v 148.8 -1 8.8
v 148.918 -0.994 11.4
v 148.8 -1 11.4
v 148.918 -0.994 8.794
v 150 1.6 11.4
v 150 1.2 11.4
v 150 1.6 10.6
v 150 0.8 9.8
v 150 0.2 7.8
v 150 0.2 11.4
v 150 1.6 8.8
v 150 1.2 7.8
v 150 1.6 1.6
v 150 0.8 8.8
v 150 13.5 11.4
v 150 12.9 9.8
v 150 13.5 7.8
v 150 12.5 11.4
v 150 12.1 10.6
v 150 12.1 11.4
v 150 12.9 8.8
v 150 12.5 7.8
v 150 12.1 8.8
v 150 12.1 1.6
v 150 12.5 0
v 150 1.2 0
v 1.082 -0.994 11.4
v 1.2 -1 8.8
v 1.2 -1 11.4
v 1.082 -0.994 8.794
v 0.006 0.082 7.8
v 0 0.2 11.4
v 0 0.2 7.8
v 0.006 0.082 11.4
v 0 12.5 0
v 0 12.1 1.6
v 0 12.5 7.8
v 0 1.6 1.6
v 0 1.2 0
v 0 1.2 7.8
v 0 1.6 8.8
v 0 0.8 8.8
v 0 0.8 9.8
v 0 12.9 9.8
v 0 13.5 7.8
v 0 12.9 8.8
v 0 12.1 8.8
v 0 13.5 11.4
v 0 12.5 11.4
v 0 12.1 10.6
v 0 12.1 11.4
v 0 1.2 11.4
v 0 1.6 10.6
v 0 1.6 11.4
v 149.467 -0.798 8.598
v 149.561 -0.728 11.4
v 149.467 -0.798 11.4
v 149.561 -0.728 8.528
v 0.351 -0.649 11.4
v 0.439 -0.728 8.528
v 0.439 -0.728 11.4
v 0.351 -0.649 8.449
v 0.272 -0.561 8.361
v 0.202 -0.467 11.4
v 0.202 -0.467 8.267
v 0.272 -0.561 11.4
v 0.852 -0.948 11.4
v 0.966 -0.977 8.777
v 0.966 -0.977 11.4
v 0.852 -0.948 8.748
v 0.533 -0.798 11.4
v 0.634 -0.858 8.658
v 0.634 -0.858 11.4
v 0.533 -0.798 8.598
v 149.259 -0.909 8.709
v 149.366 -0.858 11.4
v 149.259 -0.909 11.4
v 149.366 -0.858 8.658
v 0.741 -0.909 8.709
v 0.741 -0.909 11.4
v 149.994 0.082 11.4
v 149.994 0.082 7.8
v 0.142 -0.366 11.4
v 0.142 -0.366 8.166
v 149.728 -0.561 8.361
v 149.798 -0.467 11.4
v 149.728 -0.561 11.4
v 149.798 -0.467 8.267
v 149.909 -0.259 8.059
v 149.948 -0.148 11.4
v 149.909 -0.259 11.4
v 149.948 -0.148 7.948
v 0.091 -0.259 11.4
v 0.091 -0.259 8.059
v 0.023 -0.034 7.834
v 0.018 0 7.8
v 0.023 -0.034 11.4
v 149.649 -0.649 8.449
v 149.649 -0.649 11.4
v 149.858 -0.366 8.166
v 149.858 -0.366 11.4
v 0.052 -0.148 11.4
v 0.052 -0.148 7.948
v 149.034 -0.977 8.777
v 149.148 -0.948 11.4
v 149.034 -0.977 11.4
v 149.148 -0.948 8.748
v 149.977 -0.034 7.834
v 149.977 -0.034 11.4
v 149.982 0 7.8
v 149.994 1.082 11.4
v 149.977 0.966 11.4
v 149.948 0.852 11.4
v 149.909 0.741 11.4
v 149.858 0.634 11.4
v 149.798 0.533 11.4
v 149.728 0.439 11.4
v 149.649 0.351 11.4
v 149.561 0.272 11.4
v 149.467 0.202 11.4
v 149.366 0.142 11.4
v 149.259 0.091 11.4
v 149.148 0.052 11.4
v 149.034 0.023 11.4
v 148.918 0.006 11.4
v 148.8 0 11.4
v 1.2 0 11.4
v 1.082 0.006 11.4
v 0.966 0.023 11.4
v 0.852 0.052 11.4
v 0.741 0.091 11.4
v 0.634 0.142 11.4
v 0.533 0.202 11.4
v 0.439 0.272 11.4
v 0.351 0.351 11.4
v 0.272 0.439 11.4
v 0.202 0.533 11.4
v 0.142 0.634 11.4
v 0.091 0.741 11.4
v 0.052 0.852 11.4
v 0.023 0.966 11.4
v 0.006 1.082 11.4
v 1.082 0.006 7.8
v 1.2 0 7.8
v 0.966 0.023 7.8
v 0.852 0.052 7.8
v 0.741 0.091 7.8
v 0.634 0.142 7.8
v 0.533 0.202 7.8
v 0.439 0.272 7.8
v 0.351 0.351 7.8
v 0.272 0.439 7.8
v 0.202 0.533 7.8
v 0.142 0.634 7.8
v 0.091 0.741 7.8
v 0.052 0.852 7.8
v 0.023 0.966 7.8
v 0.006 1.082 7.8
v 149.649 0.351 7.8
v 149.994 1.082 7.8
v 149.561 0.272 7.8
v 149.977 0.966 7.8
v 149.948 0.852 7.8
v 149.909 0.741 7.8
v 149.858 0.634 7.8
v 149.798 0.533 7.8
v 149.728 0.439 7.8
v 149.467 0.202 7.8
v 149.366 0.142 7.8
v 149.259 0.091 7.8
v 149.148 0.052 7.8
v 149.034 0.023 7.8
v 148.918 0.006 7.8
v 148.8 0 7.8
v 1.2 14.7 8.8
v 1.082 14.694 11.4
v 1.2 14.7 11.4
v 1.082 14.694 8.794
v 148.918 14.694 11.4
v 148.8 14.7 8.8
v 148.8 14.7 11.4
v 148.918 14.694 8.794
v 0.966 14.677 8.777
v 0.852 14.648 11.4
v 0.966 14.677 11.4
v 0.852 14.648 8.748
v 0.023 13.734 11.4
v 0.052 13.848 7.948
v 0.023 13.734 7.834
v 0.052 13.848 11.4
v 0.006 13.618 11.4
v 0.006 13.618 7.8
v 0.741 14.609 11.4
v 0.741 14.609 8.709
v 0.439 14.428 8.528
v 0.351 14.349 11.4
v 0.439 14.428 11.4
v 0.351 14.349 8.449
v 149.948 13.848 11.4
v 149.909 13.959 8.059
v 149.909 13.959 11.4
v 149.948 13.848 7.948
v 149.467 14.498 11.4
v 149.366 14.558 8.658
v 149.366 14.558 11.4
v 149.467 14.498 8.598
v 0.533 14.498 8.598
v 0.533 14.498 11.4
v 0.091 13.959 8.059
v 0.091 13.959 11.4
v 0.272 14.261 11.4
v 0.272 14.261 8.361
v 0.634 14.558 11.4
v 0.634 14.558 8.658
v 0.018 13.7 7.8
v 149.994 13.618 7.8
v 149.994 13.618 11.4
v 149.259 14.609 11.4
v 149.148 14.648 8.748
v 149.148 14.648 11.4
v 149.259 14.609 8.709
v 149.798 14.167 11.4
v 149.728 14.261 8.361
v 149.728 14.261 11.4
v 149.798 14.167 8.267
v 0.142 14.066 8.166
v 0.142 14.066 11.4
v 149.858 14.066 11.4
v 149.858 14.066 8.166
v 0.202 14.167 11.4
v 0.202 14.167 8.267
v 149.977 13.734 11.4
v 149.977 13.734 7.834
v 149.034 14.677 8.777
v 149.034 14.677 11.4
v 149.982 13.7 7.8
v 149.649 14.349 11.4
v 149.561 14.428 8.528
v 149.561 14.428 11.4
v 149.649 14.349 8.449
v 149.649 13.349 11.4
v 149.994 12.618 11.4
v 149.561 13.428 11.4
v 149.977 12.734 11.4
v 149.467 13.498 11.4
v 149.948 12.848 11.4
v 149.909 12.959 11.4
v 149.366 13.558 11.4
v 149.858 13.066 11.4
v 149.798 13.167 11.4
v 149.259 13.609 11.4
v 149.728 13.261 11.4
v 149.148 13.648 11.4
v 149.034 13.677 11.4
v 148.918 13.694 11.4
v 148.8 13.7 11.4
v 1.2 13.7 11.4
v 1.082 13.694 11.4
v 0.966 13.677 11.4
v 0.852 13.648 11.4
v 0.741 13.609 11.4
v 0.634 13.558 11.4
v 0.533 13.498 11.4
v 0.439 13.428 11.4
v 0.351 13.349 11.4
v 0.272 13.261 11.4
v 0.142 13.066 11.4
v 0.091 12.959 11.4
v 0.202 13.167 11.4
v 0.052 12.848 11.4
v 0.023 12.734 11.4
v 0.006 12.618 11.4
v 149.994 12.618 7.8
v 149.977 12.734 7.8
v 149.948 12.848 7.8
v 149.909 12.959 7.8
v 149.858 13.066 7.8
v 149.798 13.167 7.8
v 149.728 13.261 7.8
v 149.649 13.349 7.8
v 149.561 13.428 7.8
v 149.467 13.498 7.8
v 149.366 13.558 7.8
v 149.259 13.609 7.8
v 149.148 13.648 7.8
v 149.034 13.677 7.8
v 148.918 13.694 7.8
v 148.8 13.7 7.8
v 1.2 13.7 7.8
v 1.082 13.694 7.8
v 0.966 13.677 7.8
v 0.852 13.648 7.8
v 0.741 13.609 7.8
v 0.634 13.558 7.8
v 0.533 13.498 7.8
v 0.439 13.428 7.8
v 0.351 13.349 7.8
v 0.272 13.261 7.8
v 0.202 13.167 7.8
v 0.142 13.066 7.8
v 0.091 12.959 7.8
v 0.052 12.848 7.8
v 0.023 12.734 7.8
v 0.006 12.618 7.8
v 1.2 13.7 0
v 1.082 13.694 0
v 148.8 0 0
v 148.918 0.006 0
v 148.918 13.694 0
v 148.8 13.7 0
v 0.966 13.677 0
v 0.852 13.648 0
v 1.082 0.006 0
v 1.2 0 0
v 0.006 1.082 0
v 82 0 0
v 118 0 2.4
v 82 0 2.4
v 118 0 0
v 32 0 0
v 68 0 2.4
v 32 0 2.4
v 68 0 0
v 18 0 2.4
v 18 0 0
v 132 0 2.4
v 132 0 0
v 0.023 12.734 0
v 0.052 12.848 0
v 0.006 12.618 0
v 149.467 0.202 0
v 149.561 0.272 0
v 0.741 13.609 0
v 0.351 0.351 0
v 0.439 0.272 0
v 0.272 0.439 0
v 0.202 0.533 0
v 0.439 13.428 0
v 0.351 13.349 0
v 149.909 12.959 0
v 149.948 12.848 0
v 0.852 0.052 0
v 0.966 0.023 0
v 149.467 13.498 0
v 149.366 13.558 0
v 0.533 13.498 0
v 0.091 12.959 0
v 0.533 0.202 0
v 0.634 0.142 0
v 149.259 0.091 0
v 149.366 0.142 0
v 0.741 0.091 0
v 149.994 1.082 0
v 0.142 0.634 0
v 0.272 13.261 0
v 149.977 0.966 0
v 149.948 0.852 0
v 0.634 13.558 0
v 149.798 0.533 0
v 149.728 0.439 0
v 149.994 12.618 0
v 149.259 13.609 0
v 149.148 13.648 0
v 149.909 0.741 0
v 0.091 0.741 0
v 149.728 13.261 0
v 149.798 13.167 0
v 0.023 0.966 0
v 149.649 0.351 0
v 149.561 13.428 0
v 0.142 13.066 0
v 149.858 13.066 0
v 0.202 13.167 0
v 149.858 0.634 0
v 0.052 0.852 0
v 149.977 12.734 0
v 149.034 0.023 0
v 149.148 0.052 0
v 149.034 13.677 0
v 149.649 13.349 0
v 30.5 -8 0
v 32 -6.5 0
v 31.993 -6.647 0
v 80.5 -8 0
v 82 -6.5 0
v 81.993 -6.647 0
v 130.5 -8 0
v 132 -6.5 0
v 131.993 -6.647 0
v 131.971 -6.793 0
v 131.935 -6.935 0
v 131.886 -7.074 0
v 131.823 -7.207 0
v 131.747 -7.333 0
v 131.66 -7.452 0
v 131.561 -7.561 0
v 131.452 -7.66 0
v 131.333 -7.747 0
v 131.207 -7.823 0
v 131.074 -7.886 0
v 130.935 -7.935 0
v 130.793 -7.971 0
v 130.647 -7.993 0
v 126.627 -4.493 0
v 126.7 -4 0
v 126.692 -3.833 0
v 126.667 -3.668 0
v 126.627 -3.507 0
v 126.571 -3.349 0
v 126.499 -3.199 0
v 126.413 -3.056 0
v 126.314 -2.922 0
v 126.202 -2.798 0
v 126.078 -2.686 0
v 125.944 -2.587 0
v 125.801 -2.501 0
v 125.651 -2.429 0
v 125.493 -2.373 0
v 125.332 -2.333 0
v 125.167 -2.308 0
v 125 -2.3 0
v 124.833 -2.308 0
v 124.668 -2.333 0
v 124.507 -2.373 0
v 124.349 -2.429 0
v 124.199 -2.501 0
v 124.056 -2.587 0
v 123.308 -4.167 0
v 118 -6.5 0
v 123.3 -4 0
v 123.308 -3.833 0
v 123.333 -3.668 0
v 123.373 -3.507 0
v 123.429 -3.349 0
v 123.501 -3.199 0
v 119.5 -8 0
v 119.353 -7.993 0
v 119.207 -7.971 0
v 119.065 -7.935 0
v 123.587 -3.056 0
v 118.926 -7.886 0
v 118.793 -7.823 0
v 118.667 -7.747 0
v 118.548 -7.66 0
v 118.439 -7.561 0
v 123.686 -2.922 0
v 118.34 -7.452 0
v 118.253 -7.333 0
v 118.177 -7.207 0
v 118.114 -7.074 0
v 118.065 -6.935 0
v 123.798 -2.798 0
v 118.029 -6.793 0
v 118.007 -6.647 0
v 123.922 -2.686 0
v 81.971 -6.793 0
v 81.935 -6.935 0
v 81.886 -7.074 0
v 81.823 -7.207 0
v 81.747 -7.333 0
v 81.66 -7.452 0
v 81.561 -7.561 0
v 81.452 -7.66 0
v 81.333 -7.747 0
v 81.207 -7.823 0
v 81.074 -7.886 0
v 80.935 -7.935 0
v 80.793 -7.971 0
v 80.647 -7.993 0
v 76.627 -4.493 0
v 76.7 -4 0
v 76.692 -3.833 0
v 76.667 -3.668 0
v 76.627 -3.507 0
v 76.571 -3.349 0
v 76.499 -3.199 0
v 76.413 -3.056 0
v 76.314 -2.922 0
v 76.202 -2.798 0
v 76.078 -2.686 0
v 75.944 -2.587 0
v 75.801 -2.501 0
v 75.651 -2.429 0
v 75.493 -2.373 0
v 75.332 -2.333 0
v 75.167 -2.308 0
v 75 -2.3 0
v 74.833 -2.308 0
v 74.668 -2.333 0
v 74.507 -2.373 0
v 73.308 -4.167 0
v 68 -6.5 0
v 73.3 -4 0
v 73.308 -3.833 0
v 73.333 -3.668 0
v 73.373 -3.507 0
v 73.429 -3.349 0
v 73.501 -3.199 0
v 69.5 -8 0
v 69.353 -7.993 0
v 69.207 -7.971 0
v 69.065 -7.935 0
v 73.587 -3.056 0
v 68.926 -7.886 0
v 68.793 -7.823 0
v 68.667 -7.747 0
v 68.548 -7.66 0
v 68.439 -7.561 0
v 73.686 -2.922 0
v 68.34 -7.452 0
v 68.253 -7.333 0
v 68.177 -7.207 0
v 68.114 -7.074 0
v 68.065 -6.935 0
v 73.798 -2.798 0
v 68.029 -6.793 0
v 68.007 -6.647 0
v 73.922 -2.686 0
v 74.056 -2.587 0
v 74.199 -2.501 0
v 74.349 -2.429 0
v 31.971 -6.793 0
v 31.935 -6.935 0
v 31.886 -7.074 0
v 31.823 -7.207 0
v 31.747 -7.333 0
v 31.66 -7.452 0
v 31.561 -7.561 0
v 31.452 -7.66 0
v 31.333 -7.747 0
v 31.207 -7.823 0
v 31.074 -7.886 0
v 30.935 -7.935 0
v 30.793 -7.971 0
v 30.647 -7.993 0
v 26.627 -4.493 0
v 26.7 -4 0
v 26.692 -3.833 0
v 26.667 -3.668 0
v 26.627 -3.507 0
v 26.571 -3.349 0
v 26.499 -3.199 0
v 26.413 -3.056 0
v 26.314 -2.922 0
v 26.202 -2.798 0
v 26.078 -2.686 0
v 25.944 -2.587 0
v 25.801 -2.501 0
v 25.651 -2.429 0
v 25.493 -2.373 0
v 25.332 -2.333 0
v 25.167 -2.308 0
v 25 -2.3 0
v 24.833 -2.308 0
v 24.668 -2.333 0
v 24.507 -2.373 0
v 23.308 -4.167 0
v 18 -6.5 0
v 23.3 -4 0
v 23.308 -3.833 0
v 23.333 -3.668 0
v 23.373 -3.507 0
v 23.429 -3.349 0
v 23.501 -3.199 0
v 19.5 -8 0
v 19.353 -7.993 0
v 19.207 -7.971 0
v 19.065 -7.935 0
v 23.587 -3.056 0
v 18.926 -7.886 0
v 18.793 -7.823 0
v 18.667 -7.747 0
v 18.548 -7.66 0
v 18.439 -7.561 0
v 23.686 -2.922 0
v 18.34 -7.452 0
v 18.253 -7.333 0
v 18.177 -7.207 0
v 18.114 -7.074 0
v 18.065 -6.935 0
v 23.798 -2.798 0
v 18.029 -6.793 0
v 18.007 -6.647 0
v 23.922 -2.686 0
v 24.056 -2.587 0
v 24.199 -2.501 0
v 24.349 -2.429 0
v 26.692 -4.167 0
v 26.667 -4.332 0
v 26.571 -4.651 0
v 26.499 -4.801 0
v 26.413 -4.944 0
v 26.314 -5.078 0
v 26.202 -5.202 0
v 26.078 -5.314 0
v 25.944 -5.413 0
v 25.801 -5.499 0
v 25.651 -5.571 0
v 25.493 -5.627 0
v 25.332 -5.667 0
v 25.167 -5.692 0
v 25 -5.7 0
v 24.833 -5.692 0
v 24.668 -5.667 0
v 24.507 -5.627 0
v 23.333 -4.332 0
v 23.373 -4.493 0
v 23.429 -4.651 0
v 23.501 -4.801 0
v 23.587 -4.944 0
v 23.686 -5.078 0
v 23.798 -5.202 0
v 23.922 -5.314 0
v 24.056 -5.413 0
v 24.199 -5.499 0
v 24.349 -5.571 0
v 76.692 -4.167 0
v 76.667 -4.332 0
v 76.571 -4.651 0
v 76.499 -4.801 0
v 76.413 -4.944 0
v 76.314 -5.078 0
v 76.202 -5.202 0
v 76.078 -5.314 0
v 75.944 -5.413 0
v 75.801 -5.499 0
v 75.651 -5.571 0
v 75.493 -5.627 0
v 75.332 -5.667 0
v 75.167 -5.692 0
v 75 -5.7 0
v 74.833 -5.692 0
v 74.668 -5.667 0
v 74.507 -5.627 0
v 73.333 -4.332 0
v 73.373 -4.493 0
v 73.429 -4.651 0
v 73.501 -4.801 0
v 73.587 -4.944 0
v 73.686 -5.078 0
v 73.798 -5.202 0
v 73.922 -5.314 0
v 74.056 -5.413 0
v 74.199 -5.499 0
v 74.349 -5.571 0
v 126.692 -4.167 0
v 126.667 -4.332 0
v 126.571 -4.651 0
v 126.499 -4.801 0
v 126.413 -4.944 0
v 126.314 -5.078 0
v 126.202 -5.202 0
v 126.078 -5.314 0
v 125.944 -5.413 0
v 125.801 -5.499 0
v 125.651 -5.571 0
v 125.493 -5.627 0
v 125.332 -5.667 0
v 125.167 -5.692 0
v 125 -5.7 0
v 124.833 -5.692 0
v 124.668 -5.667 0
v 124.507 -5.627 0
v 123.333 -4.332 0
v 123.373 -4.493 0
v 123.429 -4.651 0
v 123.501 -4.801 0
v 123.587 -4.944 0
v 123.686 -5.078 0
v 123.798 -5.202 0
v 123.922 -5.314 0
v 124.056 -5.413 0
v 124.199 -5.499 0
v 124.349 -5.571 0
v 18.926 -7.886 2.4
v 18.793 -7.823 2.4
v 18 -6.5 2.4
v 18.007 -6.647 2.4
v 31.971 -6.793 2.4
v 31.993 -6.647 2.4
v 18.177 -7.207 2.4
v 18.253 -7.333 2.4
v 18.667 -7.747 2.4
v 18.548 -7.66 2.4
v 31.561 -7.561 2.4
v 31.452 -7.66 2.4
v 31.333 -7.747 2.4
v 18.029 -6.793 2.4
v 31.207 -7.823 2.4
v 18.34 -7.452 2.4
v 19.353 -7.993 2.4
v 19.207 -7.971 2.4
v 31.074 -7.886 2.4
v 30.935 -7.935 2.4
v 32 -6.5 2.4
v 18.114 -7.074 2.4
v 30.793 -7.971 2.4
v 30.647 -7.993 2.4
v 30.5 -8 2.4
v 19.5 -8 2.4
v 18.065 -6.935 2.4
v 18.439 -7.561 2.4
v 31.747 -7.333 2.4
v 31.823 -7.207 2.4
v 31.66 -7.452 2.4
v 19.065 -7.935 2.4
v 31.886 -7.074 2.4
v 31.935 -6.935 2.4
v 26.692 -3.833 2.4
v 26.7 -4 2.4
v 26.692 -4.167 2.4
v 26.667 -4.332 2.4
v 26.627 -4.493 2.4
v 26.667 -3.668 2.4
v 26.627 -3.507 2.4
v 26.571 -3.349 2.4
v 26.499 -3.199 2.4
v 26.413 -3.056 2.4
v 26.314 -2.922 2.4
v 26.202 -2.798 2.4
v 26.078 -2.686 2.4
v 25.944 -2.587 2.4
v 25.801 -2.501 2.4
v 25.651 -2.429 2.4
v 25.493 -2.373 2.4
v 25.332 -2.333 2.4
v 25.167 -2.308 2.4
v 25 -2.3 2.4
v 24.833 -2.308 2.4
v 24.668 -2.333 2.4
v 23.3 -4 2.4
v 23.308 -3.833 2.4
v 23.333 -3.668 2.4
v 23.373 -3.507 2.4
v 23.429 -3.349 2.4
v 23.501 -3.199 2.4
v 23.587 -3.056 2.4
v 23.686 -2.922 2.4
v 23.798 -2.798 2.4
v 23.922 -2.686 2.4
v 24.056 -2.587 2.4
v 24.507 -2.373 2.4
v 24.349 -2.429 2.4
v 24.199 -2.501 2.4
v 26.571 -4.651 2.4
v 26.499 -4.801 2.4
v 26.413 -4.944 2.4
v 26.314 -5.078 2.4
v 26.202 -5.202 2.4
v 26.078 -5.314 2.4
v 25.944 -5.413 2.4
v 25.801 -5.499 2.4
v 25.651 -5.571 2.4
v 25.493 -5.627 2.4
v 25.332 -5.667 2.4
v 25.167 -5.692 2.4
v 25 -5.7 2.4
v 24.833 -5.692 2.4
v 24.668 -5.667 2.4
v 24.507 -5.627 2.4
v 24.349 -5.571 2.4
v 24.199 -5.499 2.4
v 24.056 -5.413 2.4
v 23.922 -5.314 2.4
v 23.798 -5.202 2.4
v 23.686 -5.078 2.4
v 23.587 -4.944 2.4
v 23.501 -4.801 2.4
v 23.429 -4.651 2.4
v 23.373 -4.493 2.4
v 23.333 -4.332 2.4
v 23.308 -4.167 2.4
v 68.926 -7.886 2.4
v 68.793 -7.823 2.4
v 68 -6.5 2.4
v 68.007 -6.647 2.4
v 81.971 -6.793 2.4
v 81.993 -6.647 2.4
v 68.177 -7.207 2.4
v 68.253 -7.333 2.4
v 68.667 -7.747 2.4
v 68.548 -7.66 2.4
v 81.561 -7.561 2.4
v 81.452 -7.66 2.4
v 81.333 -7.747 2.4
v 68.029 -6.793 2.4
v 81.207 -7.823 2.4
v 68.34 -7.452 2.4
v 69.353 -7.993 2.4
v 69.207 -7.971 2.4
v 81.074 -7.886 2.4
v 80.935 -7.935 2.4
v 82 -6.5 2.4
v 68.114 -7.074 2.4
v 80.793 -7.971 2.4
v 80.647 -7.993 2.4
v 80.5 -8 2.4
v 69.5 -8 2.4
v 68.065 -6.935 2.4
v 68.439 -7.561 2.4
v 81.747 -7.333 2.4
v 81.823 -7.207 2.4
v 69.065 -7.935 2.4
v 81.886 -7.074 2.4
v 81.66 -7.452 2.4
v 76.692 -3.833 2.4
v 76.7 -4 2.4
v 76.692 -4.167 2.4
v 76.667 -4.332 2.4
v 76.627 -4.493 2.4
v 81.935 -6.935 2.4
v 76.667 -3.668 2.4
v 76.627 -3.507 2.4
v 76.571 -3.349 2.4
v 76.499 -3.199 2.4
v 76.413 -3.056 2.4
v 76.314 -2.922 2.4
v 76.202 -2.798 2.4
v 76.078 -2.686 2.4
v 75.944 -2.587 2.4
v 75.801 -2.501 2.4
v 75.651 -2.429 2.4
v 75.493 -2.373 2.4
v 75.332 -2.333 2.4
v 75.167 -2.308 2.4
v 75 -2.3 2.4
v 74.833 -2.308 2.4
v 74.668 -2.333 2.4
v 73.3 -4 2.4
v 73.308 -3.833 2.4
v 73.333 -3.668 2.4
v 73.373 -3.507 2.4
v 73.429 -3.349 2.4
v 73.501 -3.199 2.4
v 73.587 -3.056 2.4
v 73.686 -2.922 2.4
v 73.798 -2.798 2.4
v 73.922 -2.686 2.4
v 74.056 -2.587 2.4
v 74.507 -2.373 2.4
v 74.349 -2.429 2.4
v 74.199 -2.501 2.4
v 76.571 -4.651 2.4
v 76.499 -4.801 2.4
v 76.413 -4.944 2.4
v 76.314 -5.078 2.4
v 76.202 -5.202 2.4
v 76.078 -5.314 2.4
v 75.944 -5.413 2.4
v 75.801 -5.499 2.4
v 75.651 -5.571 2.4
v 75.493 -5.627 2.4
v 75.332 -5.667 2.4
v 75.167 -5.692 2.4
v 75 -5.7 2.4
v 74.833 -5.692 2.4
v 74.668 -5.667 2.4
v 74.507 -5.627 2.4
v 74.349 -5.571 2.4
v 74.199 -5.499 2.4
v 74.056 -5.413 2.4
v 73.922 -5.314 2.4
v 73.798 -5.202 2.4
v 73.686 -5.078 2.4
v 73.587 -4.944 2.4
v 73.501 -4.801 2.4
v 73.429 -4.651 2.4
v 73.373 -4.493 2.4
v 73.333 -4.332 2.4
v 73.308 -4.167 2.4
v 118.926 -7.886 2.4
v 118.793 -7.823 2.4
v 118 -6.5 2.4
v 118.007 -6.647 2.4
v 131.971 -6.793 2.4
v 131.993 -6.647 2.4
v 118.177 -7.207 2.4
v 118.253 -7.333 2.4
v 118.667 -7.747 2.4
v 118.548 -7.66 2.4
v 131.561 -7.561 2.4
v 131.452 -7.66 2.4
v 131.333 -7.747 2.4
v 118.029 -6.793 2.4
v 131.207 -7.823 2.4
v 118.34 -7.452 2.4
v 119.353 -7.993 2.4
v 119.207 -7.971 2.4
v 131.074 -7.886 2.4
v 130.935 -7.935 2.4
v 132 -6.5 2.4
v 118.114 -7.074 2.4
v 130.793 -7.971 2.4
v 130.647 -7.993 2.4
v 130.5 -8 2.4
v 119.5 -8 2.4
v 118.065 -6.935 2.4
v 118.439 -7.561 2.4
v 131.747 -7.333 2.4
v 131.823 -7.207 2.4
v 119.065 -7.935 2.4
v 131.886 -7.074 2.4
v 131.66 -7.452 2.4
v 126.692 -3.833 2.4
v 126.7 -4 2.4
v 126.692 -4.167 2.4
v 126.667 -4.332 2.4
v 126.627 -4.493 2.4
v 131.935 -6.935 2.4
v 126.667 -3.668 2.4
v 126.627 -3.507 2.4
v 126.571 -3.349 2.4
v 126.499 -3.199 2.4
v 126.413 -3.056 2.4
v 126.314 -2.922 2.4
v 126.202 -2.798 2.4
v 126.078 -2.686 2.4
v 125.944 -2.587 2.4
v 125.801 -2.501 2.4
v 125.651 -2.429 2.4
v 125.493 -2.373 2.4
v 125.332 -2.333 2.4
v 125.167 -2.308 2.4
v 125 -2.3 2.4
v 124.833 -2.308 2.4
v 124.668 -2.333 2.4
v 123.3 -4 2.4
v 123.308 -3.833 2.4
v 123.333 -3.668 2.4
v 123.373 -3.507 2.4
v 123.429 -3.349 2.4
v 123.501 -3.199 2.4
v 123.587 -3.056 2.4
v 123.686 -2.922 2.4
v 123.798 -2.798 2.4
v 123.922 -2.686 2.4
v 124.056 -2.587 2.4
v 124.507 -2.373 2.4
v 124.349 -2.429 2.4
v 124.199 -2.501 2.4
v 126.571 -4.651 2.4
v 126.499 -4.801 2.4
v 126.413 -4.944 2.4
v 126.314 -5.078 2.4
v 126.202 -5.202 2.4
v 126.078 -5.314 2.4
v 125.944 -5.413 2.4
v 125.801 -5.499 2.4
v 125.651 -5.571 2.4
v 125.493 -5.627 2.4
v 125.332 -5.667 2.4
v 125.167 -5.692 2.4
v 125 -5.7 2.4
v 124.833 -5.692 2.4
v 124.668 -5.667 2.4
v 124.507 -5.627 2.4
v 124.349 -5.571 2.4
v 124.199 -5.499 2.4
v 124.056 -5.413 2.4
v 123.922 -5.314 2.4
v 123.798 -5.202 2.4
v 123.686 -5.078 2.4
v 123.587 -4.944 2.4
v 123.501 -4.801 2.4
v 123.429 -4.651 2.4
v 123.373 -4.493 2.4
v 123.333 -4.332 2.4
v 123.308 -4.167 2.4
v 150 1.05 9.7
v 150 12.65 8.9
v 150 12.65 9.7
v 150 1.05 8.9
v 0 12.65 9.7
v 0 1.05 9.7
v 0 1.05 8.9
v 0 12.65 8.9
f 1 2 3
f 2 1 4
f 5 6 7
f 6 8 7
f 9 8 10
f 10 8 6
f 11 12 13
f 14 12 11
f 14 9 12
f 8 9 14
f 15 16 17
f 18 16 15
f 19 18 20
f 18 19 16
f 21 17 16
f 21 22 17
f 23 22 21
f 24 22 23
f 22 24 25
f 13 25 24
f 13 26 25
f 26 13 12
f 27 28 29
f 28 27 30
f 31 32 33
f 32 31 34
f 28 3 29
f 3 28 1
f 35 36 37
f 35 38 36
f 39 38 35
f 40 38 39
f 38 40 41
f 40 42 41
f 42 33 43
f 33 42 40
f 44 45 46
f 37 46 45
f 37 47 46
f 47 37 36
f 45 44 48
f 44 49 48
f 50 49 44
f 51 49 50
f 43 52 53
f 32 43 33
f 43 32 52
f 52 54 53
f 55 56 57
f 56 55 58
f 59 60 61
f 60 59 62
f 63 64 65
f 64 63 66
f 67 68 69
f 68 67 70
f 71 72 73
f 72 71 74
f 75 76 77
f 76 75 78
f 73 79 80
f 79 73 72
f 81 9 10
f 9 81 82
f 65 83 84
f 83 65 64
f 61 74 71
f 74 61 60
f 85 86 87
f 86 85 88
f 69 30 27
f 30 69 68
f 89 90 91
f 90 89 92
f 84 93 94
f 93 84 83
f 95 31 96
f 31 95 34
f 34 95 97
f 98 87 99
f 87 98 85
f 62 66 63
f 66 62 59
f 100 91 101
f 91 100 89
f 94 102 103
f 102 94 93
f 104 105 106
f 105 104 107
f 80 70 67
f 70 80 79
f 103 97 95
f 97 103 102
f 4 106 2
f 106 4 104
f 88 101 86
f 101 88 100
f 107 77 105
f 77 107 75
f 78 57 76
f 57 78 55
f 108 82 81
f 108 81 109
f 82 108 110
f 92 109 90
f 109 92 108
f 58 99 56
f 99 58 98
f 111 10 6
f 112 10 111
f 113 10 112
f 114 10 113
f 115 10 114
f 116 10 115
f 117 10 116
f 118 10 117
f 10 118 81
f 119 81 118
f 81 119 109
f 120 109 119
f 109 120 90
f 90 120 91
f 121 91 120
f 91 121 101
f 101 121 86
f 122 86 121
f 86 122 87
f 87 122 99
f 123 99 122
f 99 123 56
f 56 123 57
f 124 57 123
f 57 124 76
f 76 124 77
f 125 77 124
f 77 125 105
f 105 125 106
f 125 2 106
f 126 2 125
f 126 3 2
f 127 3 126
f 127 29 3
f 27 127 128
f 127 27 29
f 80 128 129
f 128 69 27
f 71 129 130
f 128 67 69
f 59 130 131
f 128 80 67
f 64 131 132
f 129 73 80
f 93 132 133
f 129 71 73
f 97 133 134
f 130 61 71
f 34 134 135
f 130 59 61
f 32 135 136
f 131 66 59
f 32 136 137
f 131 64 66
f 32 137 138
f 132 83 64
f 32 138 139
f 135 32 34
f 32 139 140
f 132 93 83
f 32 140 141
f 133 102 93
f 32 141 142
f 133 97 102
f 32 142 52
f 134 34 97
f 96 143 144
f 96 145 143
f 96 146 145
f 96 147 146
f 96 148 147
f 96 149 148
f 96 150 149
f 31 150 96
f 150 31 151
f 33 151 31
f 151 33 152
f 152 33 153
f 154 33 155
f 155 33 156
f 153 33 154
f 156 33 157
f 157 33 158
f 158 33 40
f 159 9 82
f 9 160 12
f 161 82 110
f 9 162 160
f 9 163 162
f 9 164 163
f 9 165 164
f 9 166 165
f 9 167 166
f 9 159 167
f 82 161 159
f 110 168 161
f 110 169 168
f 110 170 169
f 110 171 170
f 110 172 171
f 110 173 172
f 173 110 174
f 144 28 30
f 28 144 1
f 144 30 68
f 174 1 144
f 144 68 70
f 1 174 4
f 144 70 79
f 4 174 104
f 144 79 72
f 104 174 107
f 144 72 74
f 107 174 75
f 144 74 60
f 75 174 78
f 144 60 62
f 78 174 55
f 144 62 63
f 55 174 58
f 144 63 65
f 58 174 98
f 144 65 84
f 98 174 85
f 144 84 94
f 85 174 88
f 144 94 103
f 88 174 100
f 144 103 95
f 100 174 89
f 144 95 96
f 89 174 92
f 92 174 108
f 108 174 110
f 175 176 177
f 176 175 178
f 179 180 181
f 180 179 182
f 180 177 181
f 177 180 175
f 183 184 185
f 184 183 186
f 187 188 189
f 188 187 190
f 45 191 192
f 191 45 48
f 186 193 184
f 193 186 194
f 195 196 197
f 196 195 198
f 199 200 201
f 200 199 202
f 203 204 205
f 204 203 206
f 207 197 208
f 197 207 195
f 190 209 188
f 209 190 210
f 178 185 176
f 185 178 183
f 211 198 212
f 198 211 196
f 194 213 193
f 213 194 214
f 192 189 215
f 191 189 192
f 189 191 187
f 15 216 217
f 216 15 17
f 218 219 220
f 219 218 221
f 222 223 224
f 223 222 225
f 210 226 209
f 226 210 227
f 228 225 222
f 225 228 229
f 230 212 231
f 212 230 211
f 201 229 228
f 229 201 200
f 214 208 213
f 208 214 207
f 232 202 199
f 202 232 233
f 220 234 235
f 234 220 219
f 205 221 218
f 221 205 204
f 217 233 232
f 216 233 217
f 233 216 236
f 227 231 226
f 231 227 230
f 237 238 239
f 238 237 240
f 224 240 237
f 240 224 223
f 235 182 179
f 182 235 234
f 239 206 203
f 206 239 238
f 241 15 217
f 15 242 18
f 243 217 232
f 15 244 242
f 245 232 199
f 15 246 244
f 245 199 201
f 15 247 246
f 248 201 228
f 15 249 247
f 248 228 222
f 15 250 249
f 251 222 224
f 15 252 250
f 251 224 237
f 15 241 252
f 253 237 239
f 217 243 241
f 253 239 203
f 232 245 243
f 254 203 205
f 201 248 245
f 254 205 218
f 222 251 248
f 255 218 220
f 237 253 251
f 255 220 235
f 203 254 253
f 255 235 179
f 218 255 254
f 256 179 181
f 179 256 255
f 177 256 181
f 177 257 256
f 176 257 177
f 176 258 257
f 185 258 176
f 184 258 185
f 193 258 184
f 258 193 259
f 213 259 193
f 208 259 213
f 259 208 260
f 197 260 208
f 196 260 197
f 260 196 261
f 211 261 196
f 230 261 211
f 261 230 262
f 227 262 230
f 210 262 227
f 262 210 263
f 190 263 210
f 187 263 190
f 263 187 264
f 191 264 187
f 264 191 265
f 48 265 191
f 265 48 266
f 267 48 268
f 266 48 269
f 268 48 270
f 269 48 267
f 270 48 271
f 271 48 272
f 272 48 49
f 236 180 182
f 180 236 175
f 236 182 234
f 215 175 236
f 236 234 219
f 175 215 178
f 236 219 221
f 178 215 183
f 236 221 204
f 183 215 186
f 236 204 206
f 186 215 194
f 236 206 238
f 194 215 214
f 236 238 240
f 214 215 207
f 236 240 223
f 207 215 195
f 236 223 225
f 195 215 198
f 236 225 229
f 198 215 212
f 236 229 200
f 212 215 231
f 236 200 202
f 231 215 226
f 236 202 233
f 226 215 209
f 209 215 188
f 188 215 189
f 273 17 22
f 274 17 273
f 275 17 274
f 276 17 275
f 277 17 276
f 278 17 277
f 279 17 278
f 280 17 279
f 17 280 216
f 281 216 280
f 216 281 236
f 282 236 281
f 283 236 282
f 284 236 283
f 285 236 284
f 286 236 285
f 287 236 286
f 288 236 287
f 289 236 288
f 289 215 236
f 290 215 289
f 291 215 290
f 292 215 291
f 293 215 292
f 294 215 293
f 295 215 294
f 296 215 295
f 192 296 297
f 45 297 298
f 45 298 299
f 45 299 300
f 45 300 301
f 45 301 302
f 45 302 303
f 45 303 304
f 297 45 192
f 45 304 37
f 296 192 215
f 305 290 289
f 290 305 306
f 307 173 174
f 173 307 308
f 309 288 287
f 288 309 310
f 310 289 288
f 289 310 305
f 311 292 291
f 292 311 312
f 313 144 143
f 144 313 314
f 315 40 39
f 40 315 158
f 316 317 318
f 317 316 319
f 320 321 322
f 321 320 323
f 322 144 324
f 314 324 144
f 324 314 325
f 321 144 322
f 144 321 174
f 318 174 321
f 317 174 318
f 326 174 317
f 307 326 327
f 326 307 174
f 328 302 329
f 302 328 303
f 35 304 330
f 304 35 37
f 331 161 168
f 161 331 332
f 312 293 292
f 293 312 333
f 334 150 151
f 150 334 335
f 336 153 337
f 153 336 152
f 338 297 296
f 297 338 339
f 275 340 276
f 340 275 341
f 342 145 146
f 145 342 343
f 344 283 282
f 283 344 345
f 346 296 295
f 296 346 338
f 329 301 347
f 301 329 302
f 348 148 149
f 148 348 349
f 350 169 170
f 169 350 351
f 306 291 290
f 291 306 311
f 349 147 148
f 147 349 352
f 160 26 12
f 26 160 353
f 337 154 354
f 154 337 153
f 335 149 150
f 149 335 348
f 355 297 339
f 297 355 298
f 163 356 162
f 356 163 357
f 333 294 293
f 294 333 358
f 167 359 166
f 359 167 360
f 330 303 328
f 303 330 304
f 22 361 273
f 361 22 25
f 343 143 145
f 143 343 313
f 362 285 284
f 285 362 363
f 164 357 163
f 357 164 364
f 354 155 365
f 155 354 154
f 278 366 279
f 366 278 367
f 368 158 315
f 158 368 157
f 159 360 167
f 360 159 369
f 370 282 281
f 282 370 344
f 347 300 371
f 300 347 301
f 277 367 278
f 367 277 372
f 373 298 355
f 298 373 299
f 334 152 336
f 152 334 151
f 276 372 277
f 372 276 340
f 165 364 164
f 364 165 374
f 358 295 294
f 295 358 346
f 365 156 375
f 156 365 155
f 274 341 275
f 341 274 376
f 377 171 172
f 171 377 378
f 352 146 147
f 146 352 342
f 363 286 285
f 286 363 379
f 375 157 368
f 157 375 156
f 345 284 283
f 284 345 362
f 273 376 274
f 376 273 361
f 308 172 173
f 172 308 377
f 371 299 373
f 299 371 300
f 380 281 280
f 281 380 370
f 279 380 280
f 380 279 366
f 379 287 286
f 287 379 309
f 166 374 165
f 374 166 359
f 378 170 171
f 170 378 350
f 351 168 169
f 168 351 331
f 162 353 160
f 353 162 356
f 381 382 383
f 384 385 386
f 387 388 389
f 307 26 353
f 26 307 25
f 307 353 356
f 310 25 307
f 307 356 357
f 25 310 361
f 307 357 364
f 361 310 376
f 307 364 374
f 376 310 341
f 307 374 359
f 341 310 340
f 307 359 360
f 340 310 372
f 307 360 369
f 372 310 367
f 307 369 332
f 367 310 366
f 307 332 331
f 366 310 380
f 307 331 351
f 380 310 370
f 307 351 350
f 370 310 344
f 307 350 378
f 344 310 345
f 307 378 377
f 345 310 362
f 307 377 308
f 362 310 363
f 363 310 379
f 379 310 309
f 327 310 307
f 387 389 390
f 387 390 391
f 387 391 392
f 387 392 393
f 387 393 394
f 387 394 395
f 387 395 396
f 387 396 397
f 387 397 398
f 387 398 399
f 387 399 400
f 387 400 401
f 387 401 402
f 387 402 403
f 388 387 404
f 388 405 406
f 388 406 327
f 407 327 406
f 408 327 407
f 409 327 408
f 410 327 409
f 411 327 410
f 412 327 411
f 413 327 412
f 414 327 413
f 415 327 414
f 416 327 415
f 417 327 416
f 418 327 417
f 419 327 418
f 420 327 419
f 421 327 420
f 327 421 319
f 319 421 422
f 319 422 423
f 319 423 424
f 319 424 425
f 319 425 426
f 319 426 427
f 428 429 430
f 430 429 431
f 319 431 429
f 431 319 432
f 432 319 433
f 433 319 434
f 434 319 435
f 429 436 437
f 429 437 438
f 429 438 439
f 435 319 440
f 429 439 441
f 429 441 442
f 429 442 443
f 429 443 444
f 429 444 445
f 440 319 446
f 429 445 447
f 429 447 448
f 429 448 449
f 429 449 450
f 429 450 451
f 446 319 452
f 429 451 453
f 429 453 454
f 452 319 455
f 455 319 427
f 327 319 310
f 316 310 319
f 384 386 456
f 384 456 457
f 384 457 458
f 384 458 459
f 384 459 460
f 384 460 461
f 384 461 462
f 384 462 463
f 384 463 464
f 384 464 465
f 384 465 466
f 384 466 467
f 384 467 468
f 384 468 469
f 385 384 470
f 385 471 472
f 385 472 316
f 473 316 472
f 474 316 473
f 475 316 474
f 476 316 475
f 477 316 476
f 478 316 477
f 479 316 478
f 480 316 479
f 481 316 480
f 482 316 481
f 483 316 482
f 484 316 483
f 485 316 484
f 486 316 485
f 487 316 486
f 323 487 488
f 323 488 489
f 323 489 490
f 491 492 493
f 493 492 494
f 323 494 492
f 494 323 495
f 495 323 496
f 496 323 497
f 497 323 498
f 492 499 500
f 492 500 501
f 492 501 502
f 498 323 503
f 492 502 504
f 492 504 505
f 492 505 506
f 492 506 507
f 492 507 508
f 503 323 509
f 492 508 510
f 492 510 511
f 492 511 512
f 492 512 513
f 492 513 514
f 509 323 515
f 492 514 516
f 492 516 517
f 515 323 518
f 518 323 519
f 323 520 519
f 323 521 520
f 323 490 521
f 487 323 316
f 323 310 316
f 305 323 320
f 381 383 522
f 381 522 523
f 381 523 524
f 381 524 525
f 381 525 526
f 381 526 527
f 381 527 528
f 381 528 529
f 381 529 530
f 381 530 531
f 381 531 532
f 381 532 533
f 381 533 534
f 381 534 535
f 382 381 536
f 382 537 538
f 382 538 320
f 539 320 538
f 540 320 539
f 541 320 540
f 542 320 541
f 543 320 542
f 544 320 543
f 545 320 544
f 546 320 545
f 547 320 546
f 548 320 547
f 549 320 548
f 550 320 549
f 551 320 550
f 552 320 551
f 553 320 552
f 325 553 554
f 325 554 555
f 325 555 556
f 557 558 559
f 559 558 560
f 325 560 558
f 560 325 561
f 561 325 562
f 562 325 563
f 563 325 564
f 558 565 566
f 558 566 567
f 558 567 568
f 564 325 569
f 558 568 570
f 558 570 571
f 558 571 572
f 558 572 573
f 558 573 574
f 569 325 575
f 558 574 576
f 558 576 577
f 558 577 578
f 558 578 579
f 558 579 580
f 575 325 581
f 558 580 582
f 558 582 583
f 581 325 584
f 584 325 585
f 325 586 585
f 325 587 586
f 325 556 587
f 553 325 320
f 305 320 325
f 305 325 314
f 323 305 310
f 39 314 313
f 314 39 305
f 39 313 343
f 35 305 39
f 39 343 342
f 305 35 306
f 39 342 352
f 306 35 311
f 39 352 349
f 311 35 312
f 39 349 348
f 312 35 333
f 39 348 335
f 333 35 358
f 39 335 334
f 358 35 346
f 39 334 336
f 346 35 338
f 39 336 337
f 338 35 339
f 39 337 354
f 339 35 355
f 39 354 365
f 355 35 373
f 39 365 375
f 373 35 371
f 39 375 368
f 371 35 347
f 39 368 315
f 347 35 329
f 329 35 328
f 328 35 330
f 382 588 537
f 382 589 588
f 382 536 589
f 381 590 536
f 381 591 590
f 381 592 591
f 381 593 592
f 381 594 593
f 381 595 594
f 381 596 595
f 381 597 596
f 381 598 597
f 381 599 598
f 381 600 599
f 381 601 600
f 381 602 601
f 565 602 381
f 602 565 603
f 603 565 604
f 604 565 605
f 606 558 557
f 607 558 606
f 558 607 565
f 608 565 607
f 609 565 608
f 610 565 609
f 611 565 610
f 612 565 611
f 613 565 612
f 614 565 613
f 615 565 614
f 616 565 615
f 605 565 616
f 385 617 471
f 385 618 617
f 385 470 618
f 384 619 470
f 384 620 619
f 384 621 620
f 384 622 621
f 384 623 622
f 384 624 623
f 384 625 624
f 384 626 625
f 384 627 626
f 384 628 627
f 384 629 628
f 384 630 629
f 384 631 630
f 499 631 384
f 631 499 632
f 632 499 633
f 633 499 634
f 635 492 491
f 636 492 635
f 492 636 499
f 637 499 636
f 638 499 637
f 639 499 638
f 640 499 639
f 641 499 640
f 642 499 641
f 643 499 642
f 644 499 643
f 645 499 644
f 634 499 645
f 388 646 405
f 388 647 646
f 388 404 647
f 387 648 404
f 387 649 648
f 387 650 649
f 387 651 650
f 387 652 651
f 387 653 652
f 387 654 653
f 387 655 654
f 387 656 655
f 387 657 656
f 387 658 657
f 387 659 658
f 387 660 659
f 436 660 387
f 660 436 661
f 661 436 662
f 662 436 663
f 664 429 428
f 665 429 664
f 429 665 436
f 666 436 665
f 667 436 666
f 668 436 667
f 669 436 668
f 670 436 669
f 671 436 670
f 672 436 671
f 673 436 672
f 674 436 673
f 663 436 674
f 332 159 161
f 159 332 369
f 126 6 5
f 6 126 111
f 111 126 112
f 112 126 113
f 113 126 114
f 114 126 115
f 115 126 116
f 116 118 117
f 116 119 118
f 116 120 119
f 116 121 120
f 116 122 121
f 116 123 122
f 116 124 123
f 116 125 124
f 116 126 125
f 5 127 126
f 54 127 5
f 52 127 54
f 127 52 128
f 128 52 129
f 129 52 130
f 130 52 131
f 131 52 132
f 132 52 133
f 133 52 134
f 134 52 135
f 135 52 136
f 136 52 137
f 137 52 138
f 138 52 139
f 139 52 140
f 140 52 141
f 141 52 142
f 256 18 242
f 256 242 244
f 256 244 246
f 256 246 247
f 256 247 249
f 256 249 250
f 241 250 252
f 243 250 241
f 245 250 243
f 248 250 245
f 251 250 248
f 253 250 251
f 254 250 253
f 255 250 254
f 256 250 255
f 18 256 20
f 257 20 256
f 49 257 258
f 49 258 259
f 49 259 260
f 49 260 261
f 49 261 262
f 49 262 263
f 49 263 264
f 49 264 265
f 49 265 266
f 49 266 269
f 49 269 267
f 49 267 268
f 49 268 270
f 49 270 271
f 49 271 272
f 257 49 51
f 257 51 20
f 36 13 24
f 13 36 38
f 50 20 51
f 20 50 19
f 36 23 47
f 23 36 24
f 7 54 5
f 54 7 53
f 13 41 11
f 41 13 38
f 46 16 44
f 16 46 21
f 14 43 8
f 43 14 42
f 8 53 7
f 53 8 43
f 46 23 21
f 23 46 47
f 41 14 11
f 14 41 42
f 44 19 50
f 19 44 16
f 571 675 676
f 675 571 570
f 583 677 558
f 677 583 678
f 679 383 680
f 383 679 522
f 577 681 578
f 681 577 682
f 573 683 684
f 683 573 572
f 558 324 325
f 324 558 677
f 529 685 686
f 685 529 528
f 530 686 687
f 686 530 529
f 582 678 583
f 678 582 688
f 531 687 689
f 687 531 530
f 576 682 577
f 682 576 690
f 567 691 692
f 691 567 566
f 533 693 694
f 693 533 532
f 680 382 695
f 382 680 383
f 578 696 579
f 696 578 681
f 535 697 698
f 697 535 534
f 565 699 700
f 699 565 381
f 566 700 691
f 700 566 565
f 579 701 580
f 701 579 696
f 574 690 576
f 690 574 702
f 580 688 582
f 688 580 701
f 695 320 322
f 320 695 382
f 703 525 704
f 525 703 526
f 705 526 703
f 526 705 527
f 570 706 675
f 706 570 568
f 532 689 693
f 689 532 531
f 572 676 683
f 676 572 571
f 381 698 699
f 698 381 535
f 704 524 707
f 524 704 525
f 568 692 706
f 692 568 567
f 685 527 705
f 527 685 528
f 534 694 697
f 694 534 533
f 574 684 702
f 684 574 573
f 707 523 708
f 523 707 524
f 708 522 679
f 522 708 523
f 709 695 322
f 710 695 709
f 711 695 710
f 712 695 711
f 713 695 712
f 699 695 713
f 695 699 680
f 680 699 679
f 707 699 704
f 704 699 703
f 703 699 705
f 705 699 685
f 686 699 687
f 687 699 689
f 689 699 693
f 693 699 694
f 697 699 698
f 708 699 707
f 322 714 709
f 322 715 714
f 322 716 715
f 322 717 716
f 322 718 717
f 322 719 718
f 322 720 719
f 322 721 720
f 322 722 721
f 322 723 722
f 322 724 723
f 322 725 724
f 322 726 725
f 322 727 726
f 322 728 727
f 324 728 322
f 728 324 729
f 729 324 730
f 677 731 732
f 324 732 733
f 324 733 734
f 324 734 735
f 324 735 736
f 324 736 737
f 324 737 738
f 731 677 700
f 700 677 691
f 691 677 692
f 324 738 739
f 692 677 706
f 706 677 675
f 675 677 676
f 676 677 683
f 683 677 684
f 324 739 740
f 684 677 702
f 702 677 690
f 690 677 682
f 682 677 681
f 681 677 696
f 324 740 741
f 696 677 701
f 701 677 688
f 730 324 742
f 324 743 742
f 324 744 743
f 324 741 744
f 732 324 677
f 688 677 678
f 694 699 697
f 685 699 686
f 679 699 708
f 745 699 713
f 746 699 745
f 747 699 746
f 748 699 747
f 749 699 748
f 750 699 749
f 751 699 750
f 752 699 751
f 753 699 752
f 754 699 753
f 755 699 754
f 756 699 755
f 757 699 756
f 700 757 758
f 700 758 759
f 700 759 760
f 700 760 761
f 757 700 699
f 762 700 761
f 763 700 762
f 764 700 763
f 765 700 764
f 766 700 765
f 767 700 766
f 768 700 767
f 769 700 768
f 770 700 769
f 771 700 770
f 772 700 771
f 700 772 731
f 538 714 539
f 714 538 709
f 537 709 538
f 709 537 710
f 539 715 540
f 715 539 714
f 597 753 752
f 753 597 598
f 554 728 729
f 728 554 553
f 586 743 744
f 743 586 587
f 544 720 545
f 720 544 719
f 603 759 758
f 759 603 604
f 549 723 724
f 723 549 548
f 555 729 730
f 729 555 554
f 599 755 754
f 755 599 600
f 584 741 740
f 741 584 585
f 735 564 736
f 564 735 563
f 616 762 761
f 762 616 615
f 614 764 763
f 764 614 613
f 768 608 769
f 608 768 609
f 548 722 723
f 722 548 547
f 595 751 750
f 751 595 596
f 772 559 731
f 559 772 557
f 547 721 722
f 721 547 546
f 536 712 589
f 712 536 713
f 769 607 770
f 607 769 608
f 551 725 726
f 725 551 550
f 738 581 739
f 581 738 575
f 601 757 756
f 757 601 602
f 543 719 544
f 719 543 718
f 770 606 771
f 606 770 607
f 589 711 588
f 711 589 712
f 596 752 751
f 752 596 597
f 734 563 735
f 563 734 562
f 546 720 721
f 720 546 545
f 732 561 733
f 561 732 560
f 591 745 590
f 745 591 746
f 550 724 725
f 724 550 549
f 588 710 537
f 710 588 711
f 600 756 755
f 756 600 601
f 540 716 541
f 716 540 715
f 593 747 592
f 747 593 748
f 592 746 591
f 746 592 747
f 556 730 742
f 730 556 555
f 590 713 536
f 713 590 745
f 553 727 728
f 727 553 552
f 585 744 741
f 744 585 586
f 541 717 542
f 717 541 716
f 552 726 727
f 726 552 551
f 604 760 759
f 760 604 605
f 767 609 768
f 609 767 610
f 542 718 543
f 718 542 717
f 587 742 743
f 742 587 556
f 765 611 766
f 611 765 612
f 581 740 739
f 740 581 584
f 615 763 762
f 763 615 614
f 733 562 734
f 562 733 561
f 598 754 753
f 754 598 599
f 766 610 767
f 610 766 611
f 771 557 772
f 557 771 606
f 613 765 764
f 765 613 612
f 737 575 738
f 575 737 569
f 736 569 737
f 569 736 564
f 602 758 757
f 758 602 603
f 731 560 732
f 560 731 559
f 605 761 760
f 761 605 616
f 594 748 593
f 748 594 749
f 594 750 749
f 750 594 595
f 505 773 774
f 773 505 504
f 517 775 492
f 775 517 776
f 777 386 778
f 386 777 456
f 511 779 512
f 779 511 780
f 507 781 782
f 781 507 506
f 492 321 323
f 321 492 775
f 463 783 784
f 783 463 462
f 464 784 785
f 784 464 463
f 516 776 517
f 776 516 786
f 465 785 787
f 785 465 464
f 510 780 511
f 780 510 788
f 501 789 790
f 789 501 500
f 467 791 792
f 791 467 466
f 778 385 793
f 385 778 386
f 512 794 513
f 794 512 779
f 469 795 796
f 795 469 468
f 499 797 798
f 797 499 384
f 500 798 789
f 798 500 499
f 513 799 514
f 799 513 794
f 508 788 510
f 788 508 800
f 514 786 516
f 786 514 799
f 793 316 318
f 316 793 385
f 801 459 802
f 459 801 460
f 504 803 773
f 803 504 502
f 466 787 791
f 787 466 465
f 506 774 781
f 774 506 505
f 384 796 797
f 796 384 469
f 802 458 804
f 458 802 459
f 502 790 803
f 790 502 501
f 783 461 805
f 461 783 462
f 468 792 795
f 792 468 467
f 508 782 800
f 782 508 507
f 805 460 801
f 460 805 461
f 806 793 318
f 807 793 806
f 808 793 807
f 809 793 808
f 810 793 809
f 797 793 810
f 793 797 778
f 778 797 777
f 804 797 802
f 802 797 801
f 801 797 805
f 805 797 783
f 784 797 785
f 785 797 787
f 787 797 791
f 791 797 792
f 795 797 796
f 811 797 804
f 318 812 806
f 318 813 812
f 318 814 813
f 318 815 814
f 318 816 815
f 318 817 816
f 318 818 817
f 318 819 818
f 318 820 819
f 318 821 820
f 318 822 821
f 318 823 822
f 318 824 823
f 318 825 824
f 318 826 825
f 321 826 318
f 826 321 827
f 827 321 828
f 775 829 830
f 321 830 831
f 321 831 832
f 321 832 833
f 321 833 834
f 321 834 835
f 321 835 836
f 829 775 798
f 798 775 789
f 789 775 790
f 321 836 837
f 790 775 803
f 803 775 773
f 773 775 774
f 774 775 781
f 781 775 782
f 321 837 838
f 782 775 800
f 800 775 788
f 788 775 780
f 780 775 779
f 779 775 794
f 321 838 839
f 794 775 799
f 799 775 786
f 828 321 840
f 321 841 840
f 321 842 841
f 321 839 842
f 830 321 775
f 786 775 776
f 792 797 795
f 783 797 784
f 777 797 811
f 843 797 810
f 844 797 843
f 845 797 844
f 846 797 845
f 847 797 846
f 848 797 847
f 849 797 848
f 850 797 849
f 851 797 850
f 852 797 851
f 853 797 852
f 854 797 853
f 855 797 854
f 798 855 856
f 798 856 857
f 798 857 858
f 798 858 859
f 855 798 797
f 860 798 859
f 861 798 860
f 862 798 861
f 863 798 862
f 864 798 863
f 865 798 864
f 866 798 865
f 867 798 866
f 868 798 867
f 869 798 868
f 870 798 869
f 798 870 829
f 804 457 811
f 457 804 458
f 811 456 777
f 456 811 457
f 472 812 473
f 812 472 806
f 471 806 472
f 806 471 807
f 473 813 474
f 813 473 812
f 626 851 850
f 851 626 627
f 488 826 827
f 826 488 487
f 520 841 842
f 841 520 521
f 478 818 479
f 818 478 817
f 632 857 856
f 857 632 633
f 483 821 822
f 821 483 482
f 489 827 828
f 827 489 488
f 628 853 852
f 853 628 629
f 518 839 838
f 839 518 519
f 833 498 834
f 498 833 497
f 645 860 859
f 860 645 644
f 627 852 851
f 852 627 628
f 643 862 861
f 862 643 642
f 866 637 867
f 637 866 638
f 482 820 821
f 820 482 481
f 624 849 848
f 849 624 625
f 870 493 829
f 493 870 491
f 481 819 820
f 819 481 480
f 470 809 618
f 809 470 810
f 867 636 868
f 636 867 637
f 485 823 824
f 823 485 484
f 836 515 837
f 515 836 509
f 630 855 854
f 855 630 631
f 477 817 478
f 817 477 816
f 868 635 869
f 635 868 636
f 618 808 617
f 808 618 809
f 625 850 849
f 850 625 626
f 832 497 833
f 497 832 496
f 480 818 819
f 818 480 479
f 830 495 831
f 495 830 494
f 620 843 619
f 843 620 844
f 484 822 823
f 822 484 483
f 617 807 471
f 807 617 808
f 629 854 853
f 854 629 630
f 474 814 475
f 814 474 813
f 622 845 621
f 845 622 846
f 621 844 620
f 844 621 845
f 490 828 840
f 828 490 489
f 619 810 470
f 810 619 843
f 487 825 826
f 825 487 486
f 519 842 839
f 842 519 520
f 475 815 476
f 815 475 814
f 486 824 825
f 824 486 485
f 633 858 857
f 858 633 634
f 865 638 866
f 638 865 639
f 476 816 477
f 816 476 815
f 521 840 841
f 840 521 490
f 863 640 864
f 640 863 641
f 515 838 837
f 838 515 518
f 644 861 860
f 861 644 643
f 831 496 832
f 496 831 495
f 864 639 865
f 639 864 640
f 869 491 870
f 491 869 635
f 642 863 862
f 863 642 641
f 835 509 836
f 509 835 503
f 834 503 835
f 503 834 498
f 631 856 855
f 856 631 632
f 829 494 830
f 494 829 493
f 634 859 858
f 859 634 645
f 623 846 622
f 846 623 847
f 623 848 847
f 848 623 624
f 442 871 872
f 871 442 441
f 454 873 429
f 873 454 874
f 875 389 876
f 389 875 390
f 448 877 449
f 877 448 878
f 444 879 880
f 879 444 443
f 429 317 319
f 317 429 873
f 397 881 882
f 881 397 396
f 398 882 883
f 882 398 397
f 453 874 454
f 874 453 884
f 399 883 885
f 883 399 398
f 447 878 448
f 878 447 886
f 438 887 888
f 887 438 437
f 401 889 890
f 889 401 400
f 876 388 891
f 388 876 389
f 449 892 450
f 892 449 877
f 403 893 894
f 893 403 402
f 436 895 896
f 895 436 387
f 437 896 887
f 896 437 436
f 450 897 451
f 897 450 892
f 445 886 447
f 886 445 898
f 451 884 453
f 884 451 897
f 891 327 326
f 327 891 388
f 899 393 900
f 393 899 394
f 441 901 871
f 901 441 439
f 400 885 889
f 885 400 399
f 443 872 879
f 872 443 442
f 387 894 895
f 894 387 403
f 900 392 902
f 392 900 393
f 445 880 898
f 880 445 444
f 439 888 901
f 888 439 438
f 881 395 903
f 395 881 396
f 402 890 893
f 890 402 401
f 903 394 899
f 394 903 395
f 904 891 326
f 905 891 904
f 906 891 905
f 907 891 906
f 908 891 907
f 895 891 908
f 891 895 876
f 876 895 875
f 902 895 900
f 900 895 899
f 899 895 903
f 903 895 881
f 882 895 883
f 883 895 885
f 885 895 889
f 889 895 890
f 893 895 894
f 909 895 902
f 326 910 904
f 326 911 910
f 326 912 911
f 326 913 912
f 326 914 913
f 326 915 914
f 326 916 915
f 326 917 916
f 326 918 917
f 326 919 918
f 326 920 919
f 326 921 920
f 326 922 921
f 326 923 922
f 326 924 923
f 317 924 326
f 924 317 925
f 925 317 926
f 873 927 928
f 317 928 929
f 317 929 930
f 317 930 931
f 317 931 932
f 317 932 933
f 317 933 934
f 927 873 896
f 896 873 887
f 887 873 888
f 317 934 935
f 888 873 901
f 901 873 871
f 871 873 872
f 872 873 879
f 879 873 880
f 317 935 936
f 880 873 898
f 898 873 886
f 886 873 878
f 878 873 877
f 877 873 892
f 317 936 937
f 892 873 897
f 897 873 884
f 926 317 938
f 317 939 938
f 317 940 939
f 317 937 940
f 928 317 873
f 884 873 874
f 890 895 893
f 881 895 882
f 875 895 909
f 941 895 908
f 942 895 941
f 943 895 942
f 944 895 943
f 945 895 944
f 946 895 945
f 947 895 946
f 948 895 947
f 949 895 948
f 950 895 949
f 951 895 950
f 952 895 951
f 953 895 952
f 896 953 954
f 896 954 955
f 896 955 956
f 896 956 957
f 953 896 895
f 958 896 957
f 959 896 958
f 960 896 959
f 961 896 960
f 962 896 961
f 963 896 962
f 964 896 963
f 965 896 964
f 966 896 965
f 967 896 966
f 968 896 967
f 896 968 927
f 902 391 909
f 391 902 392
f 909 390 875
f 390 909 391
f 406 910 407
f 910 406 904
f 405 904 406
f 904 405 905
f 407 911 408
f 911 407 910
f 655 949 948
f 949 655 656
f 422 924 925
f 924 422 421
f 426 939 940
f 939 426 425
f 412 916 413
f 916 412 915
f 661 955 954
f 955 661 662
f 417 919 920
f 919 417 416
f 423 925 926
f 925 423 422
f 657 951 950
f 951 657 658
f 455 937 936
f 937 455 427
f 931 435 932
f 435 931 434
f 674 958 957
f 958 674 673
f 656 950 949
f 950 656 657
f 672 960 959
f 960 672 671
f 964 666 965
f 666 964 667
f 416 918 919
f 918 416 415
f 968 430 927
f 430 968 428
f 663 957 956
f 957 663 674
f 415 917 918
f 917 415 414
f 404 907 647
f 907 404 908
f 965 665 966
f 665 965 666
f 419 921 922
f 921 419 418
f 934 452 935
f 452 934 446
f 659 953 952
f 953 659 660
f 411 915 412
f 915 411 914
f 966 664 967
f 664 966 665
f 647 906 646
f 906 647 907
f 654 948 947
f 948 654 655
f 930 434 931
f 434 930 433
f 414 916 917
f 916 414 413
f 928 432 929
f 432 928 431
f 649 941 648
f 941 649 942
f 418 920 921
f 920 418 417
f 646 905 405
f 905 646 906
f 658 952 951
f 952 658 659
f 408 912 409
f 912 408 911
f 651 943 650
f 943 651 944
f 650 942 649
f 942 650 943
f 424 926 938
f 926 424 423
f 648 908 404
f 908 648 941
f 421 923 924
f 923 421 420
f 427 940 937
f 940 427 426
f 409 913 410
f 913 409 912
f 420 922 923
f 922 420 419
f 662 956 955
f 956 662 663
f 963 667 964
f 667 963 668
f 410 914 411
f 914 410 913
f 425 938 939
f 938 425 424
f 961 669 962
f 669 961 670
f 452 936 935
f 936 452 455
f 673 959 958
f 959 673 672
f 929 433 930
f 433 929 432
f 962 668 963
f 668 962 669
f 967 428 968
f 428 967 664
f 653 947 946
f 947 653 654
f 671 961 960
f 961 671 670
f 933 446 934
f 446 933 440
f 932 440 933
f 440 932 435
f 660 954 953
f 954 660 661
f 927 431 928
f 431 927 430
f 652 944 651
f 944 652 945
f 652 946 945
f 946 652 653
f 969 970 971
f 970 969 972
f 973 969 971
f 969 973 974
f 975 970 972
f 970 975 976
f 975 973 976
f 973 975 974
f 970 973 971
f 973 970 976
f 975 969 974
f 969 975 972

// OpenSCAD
/* Parametric straight LED channel - Customizer ready */

/* [Output] */
part = "assembly"; // [assembly,body,diffuser]

/* [Channel] */
length = 150; // [20:1:1000]
strip_width = 10; // [6:0.5:20]
strip_clearance = 0.5; // [0:0.1:2]
strip_thickness = 2.2; // [0.5:0.1:5]
wall = 1.6; // [0.8:0.1:4]
base = 1.6; // [0.8:0.1:4]
air_gap = 5; // [1:0.5:20]
outer_corner_radius = 1.2; // [0:0.2:4]

/* [Diffuser] */
diffuser_thickness = 0.8; // [0.4:0.1:2.5]
diffuser_overlap = 0.8; // [0.2:0.1:2]
// Diffuser slides into a groove cut into each wall; this is how far it reaches into the wall
diffuser_clearance = 0.2; // [0:0.05:0.5]
// Total diffuser width reduction for a sliding fit (split evenly between both sides)
diffuser_width_clearance = 0.1; // [0:0.05:0.5]
// Material above the groove that holds the diffuser in
top_lip = 0.8; // [0.4:0.1:2]
// Extra wall thickness added outward around the groove (45 degree underside, no support needed)
rim_extra = 1.0; // [0:0.1:3]
preview_gap = 0; // [0:0.5:10]

/* [Mounting] */
mount_style = "single"; // [none,single,double,alternating,flange]
mount_side = "left"; // [left,right]
mount_count = 3; // [1:1:12]
ear_width = 8; // [3:0.5:20]
ear_length = 14; // [6:1:30]
ear_thickness = 2.4; // [1:0.2:5]
flange_width = 10; // [3:0.5:25]
flange_thickness = 2.4; // [1:0.2:5]
screw_diameter = 3.4; // [1.5:0.1:8]
screw_edge_offset = 4; // [2:0.5:12]

/* [Advanced] */
$fn = 64;

// Evenly spaced: equal gaps between plates, half a gap at each end
mount_positions = [for (i=[0:mount_count-1]) (i+0.5)*length/mount_count];
inside_width = strip_width + strip_clearance;
outside_width = inside_width + 2*wall;
inside_height = strip_thickness + air_gap;
groove_height = diffuser_thickness + diffuser_clearance;
groove_floor = base + inside_height;
// groove roof slopes up 45 degrees toward the cavity (self-supporting), so add its rise to the height
body_height = groove_floor + groove_height + diffuser_overlap + top_lip;
selected_side = mount_side == "right" ? 1 : -1;

assert(wall + rim_extra - diffuser_overlap >= 0.8, "wall behind the diffuser groove is under 0.8 mm; raise rim_extra or lower diffuser_overlap");
assert(screw_edge_offset < max(ear_width,flange_width), "screw hole must remain inside mount");

module rounded_rect_2d(x,y,r) {
    rr = min(r,min(x,y)/2);
    if (rr <= 0) square([x,y]);
    else offset(r=rr) offset(delta=-rr) square([x,y]);
}

module rounded_box(size=[10,10,10],r=1) {
    linear_extrude(height=size[2]) rounded_rect_2d(size[0],size[1],r);
}

module screw_hole(h) { cylinder(h=h+0.4,d=screw_diameter); }

module mounting_ear(xpos,side=-1) {
    y0 = side < 0 ? -ear_width : outside_width;
    hy = side < 0 ? -screw_edge_offset : outside_width+screw_edge_offset;
    difference() {
        translate([xpos-ear_length/2,y0,0]) linear_extrude(height=ear_thickness) {
            // round only the two outer corners; body-side edge stays square
            rounded_rect_2d(ear_length,ear_width,1.5);
            translate([0,side < 0 ? ear_width/2 : -0.02])
                square([ear_length,ear_width/2+0.02]);
        }
        translate([xpos,hy,-0.2]) screw_hole(ear_thickness);
    }
}

module mounting_flange(side=-1) {
    y0 = side < 0 ? -flange_width : outside_width;
    hy = side < 0 ? -screw_edge_offset : outside_width+screw_edge_offset;
    difference() {
        translate([0,y0,0]) cube([length,flange_width,flange_thickness]);
        for (p=mount_positions) if (p > 0 && p < length)
            translate([p,hy,-0.2]) screw_hole(flange_thickness);
    }
}

// Outward thickening around the groove; underside is a 45 degree chamfer so it prints without support
// Clipped to a rounded footprint so the ends follow outer_corner_radius like the body
module groove_rim(side) {
    e = rim_extra;
    // extends into the wall (wall is solid there anyway) so the rim and body share one rounded corner
    pts = [[wall,groove_floor-e],[wall,body_height],[-e,body_height],[-e,groove_floor],[0,groove_floor-e]];
    if (e > 0) {
        intersection() {
            translate([0,-e,0]) rounded_box([length,outside_width+2*e,body_height],outer_corner_radius);
            if (side < 0)
                rotate([90,0,90]) linear_extrude(height=length) polygon(pts);
            else
                translate([0,outside_width,0]) rotate([90,0,90]) linear_extrude(height=length)
                    polygon([for(q=pts) [-q[0],q[1]]]);
        }
    }
}

module body() {
    union() {
        difference() {
            union() {
                rounded_box([length,outside_width,body_height],outer_corner_radius);
                groove_rim(-1);
                groove_rim(1);
            }
            // LED cavity, open at the top
            translate([-0.1,wall,base]) cube([length+0.2,inside_width,body_height]);
            // diffuser groove, open at both ends so the diffuser slides in
            // roof is lowest at the groove back and rises 45 degrees toward the cavity
            translate([-0.1,0,0]) rotate([90,0,90]) linear_extrude(height=length+0.2)
                polygon([
                    [wall-diffuser_overlap,                groove_floor],
                    [wall+inside_width+diffuser_overlap,   groove_floor],
                    [wall+inside_width+diffuser_overlap,   groove_floor+groove_height],
                    [wall+inside_width,                    groove_floor+groove_height+diffuser_overlap],
                    [wall,                                 groove_floor+groove_height+diffuser_overlap],
                    [wall-diffuser_overlap,                groove_floor+groove_height]
                ]);
        }

        if (mount_style == "single")
            for (p=mount_positions) if (p > 0 && p < length) mounting_ear(p,selected_side);
        else if (mount_style == "double")
            for (p=mount_positions) if (p > 0 && p < length) { mounting_ear(p,-1); mounting_ear(p,1); }
        else if (mount_style == "alternating")
            for (i=[0:len(mount_positions)-1]) if (mount_positions[i] > 0 && mount_positions[i] < length)
                mounting_ear(mount_positions[i],i%2==0?-1:1);
        else if (mount_style == "flange") mounting_flange(selected_side);
    }
}

module diffuser() {
    w = inside_width + 2*(diffuser_overlap - diffuser_clearance) - diffuser_width_clearance;
    translate([0,wall-(diffuser_overlap-diffuser_clearance)+diffuser_width_clearance/2,groove_floor+diffuser_clearance/2+preview_gap])
        cube([length,w,diffuser_thickness]);
}

if (part == "body") body();
else if (part == "diffuser") diffuser();
else { color("dimgray") body(); color([1,1,1,0.55]) diffuser(); }
